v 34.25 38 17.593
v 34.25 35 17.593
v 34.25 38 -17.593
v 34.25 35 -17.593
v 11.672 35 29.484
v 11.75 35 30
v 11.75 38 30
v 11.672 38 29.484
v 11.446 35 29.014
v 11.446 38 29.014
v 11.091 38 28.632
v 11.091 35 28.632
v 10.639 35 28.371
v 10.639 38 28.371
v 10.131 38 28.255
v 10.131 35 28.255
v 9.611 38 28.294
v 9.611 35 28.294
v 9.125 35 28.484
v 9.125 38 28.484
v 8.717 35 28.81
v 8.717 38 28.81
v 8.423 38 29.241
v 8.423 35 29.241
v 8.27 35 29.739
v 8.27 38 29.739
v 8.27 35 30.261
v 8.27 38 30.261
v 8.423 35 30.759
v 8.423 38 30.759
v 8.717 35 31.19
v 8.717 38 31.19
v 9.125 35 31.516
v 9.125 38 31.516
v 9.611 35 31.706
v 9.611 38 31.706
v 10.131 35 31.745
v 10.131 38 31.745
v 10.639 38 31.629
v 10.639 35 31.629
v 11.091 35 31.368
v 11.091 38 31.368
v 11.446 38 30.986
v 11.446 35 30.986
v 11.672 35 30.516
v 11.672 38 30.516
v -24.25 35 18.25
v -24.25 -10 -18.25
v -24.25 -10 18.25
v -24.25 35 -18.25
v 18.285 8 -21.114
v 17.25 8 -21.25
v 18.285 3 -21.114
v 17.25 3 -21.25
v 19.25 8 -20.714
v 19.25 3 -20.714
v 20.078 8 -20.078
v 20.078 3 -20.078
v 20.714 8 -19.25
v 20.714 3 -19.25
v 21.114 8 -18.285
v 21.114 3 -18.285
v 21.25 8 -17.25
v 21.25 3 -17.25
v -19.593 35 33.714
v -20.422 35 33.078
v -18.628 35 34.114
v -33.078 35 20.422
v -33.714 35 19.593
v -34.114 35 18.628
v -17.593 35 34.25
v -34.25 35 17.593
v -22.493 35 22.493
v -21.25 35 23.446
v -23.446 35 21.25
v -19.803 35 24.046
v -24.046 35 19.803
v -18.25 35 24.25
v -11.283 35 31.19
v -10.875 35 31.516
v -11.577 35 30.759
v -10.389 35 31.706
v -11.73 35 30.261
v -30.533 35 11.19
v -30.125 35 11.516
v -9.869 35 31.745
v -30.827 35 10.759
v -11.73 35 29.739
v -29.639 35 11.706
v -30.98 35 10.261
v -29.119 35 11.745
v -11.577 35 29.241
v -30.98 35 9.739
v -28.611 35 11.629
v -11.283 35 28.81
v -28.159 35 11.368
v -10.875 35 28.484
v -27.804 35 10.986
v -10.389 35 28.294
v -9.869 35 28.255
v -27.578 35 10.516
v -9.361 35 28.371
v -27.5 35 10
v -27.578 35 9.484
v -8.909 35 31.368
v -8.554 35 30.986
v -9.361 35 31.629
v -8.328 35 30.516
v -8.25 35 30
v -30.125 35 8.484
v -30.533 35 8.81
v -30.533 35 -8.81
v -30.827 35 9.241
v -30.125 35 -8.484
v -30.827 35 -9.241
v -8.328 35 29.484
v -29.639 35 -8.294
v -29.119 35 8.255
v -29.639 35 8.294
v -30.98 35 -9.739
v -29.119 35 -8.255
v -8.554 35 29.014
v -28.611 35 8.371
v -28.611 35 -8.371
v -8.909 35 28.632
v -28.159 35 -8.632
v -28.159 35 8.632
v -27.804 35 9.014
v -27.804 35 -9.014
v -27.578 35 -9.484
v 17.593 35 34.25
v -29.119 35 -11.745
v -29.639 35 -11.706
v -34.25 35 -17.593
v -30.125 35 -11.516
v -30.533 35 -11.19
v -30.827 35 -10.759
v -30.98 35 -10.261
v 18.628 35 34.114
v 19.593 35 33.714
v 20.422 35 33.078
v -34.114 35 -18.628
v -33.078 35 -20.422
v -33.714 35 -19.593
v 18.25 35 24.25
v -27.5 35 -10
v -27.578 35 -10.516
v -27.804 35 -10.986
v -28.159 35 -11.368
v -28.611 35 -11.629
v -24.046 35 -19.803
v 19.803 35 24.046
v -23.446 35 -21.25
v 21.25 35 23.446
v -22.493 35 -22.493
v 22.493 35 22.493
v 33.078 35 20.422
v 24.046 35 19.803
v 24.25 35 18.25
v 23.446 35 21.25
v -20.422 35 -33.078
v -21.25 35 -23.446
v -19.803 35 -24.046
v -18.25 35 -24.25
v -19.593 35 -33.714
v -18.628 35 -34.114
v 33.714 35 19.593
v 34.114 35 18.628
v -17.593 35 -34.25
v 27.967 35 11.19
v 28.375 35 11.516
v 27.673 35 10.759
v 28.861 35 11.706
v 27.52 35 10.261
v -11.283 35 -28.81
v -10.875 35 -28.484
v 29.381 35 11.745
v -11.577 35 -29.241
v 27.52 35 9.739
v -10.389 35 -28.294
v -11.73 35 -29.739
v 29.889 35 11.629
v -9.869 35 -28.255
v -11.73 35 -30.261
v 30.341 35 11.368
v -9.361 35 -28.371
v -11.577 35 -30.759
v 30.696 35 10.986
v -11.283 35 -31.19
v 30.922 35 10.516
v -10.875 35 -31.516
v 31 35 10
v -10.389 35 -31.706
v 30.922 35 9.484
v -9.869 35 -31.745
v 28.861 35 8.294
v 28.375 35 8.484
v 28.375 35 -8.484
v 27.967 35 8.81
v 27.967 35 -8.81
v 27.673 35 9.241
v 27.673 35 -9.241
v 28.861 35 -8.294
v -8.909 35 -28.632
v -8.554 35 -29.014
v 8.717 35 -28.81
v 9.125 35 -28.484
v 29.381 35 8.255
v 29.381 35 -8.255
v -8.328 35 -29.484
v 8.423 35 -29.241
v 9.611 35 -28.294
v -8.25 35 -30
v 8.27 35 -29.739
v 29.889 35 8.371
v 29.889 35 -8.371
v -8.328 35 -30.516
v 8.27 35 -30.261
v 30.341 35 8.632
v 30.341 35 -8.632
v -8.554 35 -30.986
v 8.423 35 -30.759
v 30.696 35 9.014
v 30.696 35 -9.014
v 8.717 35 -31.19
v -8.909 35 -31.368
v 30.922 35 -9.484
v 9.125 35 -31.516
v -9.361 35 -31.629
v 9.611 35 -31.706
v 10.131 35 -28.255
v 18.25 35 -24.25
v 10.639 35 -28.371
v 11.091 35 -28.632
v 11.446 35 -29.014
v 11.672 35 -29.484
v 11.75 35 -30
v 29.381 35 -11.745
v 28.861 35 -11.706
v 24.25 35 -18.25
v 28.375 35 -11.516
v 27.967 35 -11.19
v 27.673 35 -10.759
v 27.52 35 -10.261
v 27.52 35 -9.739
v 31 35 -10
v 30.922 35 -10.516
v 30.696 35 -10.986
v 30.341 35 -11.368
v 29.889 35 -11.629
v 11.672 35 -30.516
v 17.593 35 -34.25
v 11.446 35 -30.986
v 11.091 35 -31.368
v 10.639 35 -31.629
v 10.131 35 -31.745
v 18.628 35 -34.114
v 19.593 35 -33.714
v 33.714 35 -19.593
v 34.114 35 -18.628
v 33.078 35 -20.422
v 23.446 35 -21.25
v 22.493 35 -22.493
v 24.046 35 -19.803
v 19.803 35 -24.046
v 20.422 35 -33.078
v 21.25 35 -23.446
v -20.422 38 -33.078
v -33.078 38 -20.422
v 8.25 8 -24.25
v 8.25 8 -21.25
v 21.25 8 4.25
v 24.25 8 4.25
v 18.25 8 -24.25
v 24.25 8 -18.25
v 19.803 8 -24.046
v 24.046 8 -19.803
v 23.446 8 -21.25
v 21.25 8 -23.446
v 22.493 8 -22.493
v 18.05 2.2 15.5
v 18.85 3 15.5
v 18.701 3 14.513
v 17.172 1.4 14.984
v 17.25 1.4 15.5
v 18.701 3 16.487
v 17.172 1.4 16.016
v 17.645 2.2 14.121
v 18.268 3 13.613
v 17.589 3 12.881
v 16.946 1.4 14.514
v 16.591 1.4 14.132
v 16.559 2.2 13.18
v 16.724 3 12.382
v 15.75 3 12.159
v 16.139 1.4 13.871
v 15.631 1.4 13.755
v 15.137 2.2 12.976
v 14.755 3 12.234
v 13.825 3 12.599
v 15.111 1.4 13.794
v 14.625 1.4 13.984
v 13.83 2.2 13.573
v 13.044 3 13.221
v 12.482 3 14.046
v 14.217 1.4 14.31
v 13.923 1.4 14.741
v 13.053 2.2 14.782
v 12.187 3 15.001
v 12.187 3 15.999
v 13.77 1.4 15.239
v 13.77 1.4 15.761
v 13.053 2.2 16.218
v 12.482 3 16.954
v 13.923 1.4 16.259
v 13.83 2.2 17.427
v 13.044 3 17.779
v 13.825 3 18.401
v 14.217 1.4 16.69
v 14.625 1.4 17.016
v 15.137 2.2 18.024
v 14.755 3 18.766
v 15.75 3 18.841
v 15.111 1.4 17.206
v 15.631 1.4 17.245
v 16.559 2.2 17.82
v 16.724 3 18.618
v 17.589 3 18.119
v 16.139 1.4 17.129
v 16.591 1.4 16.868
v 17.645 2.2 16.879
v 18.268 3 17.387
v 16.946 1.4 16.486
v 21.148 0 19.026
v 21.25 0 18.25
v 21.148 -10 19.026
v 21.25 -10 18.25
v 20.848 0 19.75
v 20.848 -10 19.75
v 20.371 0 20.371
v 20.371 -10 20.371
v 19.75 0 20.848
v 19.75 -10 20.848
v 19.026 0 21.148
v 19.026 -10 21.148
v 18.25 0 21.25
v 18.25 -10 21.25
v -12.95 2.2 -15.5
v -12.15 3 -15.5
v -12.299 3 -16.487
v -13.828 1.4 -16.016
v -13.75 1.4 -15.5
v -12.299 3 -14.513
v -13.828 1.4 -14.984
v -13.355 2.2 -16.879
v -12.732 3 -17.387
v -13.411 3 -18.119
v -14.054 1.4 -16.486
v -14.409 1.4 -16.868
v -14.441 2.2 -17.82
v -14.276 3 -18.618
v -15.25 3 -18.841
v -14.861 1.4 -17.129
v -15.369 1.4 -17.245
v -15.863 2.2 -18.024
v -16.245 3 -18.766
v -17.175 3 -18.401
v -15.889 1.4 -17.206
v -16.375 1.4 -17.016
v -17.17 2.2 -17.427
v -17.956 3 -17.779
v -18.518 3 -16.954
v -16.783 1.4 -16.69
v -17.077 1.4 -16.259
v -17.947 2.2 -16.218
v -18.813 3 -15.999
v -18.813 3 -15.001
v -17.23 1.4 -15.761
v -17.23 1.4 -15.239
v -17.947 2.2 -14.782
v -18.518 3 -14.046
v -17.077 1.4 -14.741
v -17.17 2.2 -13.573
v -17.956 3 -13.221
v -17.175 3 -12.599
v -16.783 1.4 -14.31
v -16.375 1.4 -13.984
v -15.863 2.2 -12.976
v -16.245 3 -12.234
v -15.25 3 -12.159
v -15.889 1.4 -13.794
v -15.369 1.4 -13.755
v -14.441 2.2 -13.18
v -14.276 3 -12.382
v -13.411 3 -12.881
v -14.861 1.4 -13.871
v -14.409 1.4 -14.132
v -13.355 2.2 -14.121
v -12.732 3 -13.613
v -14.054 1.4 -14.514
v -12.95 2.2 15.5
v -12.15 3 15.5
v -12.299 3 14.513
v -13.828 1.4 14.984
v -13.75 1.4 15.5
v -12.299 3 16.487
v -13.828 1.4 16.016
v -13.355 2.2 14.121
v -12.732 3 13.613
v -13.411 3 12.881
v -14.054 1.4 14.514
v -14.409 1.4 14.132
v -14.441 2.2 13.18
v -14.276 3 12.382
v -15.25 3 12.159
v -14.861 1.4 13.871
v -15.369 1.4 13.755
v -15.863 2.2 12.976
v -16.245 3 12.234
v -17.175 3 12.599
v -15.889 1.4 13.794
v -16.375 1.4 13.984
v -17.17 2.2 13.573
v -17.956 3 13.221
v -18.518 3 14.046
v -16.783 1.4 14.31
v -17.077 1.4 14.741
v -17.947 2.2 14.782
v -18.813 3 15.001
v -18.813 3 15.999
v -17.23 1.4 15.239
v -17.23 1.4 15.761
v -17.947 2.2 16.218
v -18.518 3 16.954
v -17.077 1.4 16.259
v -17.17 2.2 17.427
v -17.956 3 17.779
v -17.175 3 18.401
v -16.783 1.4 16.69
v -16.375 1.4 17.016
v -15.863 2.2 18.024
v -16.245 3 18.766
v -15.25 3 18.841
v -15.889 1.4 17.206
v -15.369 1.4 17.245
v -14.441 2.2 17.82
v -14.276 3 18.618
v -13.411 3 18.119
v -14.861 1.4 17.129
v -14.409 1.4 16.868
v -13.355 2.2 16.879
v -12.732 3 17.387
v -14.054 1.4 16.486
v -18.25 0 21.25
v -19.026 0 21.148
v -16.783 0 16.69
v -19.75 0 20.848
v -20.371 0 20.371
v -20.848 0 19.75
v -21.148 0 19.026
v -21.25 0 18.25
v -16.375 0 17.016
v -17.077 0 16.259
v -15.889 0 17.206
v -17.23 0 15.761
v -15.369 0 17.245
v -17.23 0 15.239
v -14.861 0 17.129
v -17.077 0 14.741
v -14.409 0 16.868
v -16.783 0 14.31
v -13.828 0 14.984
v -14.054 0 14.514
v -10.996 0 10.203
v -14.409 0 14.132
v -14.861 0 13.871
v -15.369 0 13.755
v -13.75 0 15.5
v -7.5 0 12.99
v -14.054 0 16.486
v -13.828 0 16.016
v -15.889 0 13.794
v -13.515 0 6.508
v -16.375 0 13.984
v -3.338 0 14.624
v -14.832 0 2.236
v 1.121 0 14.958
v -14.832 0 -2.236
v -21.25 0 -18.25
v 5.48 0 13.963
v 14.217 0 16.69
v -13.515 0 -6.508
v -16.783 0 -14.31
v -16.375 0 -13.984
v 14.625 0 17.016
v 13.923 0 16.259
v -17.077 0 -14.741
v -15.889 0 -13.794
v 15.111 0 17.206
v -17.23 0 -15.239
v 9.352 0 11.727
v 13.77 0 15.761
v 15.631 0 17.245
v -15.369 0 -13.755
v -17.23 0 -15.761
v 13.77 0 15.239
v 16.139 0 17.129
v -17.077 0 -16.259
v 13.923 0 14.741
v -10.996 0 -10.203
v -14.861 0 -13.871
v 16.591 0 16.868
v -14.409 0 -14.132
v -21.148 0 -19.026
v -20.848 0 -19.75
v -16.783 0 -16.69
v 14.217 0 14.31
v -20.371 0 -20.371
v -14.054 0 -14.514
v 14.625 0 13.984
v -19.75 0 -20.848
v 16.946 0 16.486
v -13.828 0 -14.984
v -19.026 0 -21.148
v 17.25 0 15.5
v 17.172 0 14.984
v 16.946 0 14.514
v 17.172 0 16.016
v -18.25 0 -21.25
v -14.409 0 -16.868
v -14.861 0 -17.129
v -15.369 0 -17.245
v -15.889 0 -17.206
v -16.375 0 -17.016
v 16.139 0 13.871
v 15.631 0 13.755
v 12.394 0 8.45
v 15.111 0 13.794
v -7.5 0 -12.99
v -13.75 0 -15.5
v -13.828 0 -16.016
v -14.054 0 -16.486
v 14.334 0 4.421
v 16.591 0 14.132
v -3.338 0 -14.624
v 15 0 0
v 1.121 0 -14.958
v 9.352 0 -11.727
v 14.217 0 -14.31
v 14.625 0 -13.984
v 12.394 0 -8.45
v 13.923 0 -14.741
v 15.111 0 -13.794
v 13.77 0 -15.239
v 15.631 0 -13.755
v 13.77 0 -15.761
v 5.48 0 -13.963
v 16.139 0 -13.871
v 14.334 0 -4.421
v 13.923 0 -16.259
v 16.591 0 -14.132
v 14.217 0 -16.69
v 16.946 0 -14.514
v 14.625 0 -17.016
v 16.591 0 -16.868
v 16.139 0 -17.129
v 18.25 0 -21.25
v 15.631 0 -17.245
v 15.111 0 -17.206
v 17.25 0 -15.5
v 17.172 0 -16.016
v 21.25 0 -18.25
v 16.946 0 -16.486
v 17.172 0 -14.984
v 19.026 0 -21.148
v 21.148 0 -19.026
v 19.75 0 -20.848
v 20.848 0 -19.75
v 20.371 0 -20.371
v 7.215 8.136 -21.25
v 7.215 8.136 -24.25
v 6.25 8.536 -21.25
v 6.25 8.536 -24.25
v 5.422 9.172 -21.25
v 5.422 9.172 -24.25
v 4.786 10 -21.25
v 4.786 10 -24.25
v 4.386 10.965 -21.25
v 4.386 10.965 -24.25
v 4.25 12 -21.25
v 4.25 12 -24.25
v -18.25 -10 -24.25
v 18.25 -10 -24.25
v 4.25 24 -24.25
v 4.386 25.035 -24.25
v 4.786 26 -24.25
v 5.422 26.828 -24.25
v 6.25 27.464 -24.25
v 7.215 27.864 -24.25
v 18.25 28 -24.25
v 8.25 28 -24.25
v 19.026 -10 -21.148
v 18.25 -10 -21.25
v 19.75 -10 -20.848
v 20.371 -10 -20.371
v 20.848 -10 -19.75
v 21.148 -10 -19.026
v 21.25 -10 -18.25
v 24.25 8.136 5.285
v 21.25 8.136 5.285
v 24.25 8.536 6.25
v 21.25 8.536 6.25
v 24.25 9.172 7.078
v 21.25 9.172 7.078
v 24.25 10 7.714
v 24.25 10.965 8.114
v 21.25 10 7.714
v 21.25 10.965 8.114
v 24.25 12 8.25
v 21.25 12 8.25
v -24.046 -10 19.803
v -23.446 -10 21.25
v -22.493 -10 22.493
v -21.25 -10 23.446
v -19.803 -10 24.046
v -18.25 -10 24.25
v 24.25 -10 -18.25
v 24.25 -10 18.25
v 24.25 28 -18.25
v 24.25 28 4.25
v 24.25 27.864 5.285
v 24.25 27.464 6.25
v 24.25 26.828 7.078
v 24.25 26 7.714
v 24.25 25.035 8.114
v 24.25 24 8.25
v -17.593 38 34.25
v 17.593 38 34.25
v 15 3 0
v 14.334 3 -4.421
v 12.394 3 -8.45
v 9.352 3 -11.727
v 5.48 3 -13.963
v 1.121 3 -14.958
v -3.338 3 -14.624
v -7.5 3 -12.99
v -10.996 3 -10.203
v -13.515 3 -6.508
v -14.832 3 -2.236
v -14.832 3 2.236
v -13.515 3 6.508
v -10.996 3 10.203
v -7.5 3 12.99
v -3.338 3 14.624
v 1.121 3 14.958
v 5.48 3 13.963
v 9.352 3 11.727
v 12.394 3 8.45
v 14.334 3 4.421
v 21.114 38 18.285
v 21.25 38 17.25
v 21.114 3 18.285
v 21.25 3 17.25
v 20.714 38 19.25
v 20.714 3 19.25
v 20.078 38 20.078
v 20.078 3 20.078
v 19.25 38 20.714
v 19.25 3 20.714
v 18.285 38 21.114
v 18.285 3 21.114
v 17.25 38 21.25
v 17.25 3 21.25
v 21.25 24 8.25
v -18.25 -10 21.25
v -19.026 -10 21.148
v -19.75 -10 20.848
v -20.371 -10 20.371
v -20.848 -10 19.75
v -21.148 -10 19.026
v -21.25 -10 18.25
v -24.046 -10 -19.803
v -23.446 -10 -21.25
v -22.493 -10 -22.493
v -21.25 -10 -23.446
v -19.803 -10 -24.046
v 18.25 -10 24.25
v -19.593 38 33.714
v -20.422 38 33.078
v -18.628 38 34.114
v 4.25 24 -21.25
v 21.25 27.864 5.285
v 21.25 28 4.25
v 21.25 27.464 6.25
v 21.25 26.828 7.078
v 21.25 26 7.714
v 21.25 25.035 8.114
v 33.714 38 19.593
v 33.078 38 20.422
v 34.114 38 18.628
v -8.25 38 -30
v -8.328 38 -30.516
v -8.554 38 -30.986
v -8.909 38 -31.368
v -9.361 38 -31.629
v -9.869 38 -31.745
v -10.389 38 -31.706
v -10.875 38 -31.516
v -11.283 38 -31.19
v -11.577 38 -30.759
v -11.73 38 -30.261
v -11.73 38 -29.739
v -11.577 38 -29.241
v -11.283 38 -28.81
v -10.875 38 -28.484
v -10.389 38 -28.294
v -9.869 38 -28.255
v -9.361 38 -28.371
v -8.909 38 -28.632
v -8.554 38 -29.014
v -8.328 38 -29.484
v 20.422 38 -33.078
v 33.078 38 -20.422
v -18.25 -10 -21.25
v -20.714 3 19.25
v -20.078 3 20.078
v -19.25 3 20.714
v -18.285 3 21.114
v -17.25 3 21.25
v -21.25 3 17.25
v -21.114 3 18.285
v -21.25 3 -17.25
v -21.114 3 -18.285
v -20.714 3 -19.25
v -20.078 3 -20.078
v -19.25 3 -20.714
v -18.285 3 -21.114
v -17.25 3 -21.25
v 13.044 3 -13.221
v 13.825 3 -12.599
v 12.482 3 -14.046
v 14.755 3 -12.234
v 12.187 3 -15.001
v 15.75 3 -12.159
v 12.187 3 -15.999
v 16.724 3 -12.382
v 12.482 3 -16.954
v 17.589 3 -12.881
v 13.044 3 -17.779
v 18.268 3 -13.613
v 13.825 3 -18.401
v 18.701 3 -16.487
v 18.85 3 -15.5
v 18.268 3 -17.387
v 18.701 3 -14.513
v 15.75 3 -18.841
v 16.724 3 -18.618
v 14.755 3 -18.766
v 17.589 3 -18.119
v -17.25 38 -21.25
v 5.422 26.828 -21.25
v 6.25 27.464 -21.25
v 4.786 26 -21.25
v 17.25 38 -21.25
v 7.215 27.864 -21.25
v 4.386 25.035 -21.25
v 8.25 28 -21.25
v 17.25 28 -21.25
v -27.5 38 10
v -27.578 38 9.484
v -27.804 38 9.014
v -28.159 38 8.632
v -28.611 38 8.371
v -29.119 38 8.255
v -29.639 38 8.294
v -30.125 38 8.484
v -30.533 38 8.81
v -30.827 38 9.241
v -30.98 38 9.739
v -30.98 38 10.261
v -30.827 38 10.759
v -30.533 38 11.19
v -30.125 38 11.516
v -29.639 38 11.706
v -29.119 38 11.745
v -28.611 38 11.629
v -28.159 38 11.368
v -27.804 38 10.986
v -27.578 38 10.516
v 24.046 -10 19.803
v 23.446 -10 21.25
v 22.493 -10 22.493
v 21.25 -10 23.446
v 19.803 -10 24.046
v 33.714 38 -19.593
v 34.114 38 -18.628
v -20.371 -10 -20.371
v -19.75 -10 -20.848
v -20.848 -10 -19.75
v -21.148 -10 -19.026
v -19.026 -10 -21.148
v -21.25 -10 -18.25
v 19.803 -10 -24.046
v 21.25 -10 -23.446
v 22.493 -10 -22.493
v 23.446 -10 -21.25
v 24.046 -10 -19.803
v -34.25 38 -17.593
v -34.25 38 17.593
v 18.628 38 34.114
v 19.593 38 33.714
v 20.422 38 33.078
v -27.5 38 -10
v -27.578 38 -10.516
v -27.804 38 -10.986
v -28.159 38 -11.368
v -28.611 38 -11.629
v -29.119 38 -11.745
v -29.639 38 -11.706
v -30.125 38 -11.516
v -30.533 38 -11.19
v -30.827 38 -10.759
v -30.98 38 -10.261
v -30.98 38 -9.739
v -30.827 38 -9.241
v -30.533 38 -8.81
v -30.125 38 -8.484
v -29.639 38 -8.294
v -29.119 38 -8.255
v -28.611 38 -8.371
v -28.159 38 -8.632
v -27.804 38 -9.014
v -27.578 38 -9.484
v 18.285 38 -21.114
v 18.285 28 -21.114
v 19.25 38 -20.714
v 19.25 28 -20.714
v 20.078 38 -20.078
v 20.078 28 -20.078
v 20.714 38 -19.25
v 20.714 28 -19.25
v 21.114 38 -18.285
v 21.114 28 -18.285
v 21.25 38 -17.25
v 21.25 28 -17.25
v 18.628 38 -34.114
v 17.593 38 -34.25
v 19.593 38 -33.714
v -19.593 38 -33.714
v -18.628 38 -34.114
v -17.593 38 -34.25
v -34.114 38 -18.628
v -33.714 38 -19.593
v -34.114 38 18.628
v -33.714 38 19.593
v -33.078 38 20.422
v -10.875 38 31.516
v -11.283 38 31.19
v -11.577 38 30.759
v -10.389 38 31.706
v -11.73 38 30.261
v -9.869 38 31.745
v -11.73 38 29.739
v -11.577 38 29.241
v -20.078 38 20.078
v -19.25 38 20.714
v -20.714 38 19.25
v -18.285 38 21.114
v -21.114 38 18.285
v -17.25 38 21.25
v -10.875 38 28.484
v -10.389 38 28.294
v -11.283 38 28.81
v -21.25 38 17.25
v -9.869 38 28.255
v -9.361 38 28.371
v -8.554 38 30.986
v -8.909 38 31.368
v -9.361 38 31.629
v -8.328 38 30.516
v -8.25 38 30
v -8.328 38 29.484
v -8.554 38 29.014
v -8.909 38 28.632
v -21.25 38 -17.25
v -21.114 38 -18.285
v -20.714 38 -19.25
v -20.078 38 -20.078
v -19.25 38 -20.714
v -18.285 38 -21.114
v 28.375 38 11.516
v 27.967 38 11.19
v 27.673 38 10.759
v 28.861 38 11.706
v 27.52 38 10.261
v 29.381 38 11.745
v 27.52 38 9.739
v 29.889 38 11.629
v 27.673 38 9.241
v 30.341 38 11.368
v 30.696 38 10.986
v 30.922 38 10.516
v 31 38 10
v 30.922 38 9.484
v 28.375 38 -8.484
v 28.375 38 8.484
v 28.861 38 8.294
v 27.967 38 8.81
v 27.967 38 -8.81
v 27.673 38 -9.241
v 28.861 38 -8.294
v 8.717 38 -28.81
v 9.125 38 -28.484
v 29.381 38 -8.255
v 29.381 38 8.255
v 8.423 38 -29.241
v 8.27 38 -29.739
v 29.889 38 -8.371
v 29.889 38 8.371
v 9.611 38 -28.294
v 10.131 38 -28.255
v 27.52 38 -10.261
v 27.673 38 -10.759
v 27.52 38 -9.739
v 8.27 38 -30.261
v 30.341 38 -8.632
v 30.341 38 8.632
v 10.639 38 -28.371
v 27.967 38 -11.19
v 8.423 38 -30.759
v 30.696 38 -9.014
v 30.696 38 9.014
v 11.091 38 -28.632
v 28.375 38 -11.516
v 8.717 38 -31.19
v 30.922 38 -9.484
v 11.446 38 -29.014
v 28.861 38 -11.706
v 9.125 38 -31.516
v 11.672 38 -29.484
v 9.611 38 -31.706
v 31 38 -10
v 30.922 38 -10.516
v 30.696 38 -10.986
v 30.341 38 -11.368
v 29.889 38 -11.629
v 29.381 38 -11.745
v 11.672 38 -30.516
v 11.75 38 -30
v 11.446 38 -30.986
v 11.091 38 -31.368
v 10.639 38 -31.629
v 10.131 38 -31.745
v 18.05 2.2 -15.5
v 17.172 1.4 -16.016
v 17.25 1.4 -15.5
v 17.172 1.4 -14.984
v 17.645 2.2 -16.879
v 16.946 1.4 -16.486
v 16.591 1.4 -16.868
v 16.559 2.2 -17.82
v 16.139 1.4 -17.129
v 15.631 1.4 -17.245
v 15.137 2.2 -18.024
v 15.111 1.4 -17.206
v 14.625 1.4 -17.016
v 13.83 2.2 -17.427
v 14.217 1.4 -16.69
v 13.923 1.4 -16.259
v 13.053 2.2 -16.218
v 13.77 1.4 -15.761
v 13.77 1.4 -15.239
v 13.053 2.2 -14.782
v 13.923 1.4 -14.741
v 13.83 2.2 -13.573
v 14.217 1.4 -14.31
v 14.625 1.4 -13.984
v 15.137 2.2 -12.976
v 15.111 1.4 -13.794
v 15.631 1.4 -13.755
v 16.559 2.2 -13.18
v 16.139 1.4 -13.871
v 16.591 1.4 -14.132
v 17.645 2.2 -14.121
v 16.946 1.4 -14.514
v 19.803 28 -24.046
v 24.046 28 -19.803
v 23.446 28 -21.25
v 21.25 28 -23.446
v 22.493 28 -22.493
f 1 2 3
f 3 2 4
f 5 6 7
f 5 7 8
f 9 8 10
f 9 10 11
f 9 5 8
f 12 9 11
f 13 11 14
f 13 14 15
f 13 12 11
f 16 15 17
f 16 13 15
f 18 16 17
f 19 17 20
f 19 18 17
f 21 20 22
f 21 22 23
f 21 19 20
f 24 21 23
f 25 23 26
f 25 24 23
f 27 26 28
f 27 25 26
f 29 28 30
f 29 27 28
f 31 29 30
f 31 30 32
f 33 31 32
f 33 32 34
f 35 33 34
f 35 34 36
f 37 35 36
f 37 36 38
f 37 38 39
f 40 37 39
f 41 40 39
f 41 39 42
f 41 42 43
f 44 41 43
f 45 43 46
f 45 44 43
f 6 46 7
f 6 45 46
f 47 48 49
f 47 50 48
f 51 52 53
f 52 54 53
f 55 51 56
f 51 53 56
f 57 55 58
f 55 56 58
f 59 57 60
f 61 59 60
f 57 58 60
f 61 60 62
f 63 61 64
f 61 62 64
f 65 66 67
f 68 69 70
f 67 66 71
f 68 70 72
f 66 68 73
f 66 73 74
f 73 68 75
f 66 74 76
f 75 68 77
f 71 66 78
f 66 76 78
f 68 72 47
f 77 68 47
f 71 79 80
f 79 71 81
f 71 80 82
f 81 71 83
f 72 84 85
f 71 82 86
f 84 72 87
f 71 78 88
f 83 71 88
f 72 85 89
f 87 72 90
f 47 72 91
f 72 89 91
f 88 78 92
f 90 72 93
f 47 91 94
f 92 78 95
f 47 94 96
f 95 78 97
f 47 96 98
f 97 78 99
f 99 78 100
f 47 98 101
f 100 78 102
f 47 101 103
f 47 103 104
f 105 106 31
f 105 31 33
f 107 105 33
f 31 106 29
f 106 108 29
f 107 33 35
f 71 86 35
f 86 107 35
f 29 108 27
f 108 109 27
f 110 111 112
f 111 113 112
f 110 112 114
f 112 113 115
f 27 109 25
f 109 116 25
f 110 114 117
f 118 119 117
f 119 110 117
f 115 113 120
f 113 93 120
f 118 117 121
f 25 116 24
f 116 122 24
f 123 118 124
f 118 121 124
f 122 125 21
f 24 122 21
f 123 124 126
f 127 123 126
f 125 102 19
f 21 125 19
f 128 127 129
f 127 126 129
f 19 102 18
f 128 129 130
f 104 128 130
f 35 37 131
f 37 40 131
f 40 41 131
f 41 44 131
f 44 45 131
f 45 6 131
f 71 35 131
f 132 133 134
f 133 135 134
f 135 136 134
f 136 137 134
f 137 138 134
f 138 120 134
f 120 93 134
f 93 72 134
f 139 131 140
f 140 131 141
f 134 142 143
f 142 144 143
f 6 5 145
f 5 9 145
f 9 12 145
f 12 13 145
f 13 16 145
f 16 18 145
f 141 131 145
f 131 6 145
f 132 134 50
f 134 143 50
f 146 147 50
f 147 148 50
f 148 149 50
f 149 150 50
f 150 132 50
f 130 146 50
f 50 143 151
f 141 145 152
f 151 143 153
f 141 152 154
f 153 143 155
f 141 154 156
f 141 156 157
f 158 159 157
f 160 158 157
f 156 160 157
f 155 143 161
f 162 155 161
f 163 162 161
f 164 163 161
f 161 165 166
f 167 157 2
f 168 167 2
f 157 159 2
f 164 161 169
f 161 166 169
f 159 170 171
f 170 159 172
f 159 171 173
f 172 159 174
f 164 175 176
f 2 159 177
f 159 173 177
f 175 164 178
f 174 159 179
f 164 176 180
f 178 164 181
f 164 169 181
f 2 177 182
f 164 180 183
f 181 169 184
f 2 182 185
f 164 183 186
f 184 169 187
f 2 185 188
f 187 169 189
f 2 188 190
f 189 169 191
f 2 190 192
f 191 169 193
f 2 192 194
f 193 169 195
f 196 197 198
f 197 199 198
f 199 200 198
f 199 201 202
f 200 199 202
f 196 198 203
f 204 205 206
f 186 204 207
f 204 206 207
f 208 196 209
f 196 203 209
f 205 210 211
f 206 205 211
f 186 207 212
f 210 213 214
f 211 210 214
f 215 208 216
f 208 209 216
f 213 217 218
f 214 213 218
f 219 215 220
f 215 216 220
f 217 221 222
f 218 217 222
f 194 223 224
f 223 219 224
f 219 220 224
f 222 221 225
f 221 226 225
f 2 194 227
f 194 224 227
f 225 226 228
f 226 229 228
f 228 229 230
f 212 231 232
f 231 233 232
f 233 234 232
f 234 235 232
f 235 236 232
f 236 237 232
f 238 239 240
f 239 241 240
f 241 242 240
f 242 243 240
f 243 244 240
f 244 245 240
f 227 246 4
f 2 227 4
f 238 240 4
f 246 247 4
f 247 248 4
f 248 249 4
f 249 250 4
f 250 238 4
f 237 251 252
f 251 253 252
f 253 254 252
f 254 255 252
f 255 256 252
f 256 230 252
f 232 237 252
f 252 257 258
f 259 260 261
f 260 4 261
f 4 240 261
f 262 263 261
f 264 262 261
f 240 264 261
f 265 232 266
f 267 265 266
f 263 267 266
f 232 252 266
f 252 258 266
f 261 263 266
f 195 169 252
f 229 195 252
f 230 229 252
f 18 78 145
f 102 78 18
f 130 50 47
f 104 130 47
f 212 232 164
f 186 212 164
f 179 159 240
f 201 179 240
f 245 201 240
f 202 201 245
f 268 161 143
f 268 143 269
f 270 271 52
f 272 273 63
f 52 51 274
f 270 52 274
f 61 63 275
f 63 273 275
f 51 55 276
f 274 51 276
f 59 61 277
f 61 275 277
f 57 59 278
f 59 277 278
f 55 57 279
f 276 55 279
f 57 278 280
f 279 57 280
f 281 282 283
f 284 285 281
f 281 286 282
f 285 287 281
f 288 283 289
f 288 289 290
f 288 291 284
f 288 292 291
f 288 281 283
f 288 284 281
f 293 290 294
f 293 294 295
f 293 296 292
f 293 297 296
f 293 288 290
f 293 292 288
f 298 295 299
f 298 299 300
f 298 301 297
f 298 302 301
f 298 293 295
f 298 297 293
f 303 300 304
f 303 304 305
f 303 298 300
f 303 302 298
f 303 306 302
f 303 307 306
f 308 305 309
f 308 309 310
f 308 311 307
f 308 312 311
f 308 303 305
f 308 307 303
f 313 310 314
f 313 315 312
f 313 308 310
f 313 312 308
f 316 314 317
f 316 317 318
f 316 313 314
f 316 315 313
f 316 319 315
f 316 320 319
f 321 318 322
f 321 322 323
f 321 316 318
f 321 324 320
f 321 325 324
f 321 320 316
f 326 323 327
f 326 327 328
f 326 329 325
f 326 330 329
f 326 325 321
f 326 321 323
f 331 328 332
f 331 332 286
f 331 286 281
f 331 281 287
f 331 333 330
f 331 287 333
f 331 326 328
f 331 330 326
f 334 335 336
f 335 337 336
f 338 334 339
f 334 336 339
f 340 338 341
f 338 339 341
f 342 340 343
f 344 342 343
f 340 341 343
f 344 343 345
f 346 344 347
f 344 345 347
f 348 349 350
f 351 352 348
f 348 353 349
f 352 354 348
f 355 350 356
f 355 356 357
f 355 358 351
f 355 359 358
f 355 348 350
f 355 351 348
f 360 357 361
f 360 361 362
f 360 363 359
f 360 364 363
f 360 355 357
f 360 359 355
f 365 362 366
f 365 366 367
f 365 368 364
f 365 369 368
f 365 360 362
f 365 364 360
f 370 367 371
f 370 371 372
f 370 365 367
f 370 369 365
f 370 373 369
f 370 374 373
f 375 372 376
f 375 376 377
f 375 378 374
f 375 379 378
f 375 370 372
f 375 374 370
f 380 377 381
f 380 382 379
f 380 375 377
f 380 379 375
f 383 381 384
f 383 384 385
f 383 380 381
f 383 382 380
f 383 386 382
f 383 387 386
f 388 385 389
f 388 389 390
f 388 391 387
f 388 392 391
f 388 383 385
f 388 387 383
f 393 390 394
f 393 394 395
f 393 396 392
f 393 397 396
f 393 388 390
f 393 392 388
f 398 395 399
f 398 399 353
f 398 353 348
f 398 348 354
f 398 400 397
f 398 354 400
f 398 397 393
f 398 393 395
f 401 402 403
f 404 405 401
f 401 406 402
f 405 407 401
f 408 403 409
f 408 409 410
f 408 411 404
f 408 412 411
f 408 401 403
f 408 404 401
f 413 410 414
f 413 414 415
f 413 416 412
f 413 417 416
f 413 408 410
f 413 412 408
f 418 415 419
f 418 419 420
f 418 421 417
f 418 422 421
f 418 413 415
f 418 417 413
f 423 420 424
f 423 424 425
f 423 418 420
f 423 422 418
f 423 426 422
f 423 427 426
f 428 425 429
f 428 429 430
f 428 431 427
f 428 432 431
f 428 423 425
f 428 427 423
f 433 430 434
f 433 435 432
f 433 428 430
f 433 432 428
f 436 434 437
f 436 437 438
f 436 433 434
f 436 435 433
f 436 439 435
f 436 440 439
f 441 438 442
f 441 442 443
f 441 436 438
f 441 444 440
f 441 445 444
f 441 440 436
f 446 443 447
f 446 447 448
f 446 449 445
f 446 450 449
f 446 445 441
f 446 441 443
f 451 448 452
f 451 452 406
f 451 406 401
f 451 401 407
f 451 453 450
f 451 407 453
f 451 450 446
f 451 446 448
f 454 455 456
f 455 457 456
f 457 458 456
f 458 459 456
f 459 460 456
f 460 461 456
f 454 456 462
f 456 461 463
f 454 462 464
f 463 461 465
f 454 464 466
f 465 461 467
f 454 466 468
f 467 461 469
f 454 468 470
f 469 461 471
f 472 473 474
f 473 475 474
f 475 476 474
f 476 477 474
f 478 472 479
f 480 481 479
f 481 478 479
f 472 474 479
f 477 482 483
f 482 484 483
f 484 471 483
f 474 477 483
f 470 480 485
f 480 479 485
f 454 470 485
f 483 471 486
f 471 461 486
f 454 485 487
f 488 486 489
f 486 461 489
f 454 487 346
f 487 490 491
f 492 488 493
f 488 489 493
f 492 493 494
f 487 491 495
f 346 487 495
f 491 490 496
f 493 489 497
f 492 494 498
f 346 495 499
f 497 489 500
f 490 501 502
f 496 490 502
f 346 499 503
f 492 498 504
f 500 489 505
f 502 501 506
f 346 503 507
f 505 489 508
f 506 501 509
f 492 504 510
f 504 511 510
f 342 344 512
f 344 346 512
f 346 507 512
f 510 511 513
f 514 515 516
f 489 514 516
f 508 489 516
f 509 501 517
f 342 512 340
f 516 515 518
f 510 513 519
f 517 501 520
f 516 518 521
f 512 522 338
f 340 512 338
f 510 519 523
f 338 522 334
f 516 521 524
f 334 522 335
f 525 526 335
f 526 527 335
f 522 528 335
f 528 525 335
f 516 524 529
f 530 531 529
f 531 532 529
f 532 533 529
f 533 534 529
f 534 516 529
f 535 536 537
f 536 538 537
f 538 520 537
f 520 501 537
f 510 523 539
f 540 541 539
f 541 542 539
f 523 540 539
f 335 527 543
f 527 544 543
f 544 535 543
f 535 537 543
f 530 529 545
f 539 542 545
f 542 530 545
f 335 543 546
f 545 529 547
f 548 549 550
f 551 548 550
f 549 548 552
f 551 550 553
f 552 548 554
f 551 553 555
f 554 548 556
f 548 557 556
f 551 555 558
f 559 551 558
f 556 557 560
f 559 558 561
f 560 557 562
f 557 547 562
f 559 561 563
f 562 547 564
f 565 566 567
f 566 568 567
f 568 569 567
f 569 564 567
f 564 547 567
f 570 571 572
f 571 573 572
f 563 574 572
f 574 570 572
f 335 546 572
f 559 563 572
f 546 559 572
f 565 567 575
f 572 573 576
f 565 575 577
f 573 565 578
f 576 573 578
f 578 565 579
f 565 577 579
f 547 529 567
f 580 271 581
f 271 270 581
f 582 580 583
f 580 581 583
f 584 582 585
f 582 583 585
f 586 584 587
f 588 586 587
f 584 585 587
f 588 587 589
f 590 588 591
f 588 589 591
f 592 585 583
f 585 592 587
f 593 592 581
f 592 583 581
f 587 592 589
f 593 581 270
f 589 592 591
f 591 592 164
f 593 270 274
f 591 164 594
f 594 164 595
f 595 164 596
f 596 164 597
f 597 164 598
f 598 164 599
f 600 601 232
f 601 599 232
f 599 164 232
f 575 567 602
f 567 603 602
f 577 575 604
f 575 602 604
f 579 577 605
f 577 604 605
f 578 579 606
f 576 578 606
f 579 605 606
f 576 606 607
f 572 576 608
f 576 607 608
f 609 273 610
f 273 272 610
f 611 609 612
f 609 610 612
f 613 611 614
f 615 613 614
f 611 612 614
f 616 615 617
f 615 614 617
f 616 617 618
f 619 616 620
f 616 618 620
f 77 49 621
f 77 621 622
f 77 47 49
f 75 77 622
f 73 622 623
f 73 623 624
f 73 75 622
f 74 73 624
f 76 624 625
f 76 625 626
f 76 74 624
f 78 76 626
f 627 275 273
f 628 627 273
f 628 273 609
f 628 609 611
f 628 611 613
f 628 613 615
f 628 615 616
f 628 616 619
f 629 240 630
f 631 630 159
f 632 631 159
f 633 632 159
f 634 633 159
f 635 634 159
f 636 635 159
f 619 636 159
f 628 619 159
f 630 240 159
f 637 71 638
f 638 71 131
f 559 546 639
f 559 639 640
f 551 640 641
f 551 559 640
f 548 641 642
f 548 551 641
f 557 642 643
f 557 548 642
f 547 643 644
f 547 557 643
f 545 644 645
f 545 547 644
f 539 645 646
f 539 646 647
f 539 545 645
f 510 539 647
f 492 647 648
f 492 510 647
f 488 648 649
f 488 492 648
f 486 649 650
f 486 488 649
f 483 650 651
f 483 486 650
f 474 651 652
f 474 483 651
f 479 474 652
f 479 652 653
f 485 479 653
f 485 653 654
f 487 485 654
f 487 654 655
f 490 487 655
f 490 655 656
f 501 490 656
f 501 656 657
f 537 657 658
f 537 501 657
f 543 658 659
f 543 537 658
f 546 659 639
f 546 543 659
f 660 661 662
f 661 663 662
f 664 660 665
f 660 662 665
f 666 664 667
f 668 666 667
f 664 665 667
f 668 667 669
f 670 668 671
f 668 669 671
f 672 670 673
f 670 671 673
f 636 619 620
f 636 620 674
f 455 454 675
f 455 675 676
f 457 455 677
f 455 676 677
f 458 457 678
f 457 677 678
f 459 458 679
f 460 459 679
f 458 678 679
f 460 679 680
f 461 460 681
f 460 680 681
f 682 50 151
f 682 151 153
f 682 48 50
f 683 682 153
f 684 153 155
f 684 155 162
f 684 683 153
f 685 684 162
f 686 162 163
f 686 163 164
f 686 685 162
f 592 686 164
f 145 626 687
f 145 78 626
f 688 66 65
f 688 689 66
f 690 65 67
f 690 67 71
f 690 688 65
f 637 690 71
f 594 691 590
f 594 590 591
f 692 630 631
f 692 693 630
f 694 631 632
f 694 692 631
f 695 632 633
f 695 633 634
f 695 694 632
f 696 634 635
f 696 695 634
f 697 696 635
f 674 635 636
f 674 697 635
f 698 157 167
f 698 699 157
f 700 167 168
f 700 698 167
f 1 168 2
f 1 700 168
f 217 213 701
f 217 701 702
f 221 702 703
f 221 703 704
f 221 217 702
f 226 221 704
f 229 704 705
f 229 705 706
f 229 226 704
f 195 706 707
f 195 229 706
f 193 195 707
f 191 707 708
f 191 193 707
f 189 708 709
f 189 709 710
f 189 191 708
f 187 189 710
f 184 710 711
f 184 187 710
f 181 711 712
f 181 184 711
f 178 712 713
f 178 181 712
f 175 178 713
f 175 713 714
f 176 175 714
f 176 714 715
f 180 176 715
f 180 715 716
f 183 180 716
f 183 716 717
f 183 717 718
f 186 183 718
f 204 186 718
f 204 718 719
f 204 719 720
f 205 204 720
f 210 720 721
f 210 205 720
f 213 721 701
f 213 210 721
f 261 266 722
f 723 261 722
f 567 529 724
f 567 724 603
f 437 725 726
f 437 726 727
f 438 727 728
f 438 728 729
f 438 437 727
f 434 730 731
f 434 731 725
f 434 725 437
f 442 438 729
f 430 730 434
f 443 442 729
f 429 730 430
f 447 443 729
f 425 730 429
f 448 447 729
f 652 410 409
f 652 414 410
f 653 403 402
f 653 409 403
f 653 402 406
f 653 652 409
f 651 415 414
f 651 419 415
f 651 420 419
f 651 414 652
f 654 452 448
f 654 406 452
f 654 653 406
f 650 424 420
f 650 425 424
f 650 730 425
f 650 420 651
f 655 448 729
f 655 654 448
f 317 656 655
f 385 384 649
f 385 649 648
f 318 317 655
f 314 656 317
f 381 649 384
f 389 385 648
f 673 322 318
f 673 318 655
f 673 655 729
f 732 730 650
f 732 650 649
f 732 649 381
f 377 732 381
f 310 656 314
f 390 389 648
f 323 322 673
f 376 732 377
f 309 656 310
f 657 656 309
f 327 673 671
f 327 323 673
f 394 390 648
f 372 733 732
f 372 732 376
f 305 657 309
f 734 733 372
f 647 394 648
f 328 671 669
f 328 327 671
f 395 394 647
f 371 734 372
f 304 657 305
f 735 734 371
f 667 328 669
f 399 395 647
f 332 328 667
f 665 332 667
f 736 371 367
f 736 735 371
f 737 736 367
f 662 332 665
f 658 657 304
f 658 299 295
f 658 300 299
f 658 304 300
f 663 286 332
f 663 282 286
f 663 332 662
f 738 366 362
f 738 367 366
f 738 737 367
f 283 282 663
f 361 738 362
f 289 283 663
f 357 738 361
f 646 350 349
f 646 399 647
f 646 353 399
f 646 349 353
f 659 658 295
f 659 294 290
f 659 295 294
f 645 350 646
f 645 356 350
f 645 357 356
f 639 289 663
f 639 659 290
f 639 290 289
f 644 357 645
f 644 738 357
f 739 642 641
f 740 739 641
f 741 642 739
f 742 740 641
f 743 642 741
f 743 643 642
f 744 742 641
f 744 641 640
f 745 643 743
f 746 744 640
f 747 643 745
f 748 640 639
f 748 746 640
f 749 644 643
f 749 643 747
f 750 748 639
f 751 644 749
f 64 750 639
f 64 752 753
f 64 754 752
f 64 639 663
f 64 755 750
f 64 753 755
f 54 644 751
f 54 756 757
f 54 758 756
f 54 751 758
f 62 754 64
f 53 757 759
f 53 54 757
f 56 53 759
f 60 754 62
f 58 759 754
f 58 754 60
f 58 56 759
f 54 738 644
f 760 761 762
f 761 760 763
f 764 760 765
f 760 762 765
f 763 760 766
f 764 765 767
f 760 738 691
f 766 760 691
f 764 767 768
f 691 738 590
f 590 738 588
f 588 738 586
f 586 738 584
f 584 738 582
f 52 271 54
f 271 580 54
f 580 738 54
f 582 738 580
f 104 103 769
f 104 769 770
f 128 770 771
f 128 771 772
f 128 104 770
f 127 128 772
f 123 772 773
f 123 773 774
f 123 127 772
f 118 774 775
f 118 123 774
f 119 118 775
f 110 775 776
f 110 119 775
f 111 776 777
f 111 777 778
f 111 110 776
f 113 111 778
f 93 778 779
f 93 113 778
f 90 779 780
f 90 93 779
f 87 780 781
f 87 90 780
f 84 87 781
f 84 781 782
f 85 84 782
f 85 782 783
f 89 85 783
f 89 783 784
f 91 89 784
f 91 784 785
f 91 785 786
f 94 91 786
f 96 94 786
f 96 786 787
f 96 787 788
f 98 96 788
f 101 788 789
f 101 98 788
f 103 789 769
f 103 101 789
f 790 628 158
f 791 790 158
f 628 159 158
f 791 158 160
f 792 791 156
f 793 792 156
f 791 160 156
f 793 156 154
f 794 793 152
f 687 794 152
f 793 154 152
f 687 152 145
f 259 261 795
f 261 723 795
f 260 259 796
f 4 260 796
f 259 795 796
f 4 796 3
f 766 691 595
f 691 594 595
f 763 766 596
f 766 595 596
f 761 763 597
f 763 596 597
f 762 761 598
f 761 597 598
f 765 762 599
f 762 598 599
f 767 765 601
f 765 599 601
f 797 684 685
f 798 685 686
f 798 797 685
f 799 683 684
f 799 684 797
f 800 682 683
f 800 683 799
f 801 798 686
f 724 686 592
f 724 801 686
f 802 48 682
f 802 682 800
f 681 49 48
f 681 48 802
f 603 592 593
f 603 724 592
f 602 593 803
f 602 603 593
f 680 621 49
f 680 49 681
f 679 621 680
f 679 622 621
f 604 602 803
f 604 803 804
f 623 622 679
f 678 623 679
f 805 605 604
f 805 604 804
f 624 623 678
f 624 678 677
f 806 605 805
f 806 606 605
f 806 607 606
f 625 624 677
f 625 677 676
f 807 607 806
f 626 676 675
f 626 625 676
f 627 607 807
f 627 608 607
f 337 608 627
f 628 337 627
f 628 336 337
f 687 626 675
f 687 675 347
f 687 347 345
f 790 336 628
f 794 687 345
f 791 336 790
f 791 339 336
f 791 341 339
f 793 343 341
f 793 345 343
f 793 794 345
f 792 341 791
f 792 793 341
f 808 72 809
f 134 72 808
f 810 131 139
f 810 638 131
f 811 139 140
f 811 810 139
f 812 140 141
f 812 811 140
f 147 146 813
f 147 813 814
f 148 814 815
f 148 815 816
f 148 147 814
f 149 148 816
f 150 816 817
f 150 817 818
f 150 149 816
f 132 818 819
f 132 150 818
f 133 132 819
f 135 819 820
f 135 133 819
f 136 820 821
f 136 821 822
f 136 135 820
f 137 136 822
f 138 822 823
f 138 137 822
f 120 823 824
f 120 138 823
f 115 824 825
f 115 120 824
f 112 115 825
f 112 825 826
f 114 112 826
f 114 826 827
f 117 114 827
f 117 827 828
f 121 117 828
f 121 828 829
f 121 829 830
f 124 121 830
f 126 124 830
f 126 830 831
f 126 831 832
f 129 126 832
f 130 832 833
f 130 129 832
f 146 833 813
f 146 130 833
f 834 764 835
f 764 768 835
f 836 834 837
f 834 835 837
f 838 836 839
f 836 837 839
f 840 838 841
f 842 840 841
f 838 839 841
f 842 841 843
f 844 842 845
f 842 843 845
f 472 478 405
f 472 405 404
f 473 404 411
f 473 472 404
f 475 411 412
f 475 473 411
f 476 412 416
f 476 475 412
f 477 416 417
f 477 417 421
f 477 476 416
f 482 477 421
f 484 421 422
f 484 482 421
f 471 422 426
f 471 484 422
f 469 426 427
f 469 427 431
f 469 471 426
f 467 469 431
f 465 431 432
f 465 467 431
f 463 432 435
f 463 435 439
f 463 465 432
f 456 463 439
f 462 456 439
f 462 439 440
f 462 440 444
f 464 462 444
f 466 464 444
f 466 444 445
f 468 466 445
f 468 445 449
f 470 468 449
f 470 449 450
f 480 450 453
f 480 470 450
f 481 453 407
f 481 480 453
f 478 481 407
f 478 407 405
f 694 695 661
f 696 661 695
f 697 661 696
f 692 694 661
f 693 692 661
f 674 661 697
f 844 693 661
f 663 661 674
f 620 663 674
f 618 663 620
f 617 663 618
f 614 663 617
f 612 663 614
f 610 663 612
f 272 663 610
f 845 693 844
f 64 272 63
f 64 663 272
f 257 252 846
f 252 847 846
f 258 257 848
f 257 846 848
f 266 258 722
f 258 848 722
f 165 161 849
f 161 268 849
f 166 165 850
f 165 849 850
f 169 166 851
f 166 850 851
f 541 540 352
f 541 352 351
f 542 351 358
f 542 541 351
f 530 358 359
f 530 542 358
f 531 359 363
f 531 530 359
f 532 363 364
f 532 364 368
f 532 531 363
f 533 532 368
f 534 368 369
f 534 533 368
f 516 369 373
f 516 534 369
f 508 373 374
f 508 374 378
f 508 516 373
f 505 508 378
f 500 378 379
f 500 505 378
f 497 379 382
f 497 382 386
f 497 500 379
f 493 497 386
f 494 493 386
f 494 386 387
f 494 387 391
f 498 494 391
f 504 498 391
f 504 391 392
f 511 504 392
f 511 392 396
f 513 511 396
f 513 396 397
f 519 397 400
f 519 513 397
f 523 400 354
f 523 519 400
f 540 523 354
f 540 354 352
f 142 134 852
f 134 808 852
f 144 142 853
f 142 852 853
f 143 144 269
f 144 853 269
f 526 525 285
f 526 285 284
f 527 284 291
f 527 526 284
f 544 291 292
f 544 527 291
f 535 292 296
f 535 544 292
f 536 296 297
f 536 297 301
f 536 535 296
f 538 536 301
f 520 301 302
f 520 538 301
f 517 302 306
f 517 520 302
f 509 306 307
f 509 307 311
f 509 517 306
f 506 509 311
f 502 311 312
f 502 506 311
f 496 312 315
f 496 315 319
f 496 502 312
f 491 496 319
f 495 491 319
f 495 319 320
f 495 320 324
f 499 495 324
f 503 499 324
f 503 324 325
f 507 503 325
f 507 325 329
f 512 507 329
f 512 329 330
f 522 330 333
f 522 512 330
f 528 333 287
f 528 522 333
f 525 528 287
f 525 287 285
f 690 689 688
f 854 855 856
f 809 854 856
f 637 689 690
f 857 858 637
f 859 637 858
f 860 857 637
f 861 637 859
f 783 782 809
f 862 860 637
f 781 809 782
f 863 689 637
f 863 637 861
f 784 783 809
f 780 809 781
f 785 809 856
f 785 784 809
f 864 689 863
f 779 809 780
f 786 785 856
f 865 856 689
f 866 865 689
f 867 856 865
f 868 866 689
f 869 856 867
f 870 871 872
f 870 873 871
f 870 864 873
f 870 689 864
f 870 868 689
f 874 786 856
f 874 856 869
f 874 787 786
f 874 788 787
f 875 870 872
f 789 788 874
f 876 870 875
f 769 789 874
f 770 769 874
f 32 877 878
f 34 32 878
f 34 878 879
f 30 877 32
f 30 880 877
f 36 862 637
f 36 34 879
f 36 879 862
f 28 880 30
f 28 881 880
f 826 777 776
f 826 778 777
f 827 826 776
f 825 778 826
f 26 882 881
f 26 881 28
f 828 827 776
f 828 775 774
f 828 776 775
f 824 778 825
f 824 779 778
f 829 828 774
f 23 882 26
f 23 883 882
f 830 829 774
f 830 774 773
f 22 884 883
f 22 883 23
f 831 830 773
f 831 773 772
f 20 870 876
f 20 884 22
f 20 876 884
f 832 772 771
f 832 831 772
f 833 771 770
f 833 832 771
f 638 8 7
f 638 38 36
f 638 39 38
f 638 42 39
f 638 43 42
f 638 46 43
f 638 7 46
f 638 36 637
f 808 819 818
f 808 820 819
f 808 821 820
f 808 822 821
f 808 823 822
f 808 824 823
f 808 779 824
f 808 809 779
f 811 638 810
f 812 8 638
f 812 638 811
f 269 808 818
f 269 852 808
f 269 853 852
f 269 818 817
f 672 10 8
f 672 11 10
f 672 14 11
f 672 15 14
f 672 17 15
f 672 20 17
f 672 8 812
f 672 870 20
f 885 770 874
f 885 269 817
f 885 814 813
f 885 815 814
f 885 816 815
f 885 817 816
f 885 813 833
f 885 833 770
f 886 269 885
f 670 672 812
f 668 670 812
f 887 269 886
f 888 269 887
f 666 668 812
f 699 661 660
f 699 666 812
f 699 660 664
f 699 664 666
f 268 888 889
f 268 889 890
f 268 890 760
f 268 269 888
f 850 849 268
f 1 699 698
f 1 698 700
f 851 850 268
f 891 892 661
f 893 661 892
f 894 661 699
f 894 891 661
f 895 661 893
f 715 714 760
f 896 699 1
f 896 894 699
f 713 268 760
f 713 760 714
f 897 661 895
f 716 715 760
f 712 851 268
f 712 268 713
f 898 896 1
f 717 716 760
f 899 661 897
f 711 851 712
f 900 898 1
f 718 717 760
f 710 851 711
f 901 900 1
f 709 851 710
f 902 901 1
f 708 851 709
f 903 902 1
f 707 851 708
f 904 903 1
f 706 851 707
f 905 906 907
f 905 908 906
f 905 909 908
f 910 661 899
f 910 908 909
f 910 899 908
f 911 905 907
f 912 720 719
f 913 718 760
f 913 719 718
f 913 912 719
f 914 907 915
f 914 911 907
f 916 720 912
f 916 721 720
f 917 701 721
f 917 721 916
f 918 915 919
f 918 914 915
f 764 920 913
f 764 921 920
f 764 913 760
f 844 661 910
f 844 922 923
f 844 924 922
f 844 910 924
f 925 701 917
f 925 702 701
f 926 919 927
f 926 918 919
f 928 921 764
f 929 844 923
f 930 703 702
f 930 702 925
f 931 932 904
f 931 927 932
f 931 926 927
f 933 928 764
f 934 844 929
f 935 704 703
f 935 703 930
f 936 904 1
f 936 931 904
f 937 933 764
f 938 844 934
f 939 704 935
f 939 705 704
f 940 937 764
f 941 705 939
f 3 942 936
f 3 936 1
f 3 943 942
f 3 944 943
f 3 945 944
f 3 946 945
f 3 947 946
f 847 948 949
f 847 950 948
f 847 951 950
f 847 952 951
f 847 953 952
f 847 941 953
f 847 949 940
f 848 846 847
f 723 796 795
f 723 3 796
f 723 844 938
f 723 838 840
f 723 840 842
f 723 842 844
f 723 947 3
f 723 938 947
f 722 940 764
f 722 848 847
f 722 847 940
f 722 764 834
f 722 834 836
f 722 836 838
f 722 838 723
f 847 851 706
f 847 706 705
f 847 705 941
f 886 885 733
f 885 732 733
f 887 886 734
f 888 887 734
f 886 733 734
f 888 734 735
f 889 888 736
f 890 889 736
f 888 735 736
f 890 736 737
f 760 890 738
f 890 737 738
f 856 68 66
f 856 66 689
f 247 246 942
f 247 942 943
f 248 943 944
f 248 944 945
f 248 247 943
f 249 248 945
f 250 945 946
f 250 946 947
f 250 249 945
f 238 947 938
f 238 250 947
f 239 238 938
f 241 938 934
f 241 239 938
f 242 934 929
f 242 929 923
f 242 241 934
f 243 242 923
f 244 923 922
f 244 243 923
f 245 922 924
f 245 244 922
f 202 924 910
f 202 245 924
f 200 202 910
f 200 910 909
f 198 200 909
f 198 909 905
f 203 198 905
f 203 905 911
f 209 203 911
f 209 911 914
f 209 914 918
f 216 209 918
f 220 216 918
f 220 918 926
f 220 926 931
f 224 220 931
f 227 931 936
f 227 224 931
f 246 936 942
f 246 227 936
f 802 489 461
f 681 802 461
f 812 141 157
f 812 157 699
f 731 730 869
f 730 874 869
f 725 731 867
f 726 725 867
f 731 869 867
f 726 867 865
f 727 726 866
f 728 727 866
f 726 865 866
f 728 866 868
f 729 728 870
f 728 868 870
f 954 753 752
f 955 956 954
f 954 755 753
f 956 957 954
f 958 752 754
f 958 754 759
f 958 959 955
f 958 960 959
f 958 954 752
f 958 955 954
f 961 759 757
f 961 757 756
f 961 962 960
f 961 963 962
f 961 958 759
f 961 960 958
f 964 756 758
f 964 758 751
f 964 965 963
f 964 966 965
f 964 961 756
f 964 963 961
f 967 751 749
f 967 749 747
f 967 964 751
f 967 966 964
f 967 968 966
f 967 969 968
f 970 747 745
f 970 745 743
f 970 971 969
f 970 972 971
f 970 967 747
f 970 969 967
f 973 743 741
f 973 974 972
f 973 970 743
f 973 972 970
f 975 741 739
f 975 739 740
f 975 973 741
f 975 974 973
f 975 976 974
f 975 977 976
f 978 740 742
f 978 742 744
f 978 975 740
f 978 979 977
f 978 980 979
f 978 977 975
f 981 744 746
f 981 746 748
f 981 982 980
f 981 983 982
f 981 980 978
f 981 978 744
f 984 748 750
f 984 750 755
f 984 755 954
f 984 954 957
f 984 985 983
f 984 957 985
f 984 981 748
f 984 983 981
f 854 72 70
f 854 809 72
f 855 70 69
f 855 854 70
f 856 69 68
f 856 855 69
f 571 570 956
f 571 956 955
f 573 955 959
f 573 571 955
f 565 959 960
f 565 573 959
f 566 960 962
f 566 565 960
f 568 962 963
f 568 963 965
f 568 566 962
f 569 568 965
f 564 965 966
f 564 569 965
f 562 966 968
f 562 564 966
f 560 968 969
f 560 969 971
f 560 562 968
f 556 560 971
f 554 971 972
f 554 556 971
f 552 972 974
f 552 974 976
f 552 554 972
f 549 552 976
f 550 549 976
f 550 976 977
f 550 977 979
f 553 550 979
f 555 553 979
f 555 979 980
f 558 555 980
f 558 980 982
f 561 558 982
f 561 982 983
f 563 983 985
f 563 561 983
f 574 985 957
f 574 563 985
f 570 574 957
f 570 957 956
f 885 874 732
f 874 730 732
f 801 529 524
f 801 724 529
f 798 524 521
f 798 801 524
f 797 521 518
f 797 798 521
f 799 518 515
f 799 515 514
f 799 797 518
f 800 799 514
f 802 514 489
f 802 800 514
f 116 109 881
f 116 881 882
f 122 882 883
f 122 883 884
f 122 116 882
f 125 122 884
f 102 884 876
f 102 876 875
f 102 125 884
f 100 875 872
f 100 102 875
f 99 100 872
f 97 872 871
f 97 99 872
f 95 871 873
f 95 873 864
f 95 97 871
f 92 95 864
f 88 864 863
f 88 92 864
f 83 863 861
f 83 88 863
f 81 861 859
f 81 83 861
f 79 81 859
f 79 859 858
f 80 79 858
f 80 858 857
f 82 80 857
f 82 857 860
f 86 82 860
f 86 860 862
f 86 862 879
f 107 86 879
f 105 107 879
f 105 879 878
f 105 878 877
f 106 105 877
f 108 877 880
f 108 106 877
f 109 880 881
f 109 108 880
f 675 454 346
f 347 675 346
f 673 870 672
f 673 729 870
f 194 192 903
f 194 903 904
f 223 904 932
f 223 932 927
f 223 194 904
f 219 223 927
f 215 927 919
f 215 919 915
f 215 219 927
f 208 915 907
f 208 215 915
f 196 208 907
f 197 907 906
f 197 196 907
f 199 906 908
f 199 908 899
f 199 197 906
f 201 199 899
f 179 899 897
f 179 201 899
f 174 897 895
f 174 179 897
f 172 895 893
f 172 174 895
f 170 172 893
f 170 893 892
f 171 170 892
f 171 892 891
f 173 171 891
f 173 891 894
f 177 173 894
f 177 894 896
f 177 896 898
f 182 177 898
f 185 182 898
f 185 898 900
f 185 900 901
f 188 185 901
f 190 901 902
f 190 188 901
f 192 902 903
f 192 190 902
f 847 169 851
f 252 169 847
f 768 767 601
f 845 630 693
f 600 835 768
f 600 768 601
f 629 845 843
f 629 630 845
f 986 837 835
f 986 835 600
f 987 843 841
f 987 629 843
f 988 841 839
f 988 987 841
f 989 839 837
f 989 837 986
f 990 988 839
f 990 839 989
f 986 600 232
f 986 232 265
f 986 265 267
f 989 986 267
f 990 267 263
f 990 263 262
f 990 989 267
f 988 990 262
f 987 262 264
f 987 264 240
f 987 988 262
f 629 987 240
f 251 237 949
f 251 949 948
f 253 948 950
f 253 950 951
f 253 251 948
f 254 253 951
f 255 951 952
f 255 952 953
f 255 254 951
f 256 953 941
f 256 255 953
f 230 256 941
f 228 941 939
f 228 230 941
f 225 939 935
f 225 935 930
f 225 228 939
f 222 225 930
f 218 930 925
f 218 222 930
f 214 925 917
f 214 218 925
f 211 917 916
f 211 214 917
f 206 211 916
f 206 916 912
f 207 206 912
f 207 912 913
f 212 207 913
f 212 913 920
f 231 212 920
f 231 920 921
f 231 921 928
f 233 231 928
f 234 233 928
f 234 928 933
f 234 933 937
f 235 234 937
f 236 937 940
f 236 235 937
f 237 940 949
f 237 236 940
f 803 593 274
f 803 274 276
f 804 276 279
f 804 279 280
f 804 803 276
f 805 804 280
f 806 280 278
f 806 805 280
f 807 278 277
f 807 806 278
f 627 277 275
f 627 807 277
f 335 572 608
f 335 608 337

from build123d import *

# Parameters (mm, degrees)
SKETCH2_W           = 48.5
SKETCH2_H           = 48.5
SKETCH2_R           = 15
SKETCH2_R_2         = 1.75
BOSS_EXTRUDE1_DEPTH = 3
SKETCH3_W           = 48.5
SKETCH3_H           = 48.5
SKETCH3_W_2         = 42.5
SKETCH3_H_2         = 42.5
BOSS_EXTRUDE2_DEPTH = 32
SKETCH4_W           = 68.5
SKETCH4_H           = 68.5
SKETCH4_R           = 1.75
SKETCH4_W_2         = 42.5
SKETCH4_H_2         = 42.5
BOSS_EXTRUDE3_DEPTH = 3
CHAMFER1_SIZE       = 15
SKETCH5_W           = 48.5
SKETCH5_H           = 48.5
SKETCH5_W_2         = 42.5
SKETCH5_H_2         = 42.5
BOSS_EXTRUDE4_DEPTH = 10
FILLET1_R           = 6
SKETCH7_W           = 45
SKETCH7_H           = 20
CUT_EXTRUDE2_DEPTH  = 20
FILLET2_R           = 4
CHAMFER2_SIZE       = 1.6
FILLET4_R           = 4
FILLET5_R           = 4
FILLET6_R           = 3


with BuildPart() as part:
    # Sketch2 → Boss-Extrude1 (new body)
    with BuildSketch(Plane(origin=(0, 0, 0), x_dir=(1, 0, 0), z_dir=(0, 1, 0))):
        Rectangle(SKETCH2_W, SKETCH2_H)
        Circle(SKETCH2_R, mode=Mode.SUBTRACT)
        with Locations((-15.5, 15.5)):
            Circle(SKETCH2_R_2, mode=Mode.SUBTRACT)
        with Locations((15.5, 15.5)):
            Circle(SKETCH2_R_2, mode=Mode.SUBTRACT)
        with Locations((15.5, -15.5)):
            Circle(SKETCH2_R_2, mode=Mode.SUBTRACT)
        with Locations((-15.5, -15.5)):
            Circle(SKETCH2_R_2, mode=Mode.SUBTRACT)
    extrude(amount=BOSS_EXTRUDE1_DEPTH)

    # Sketch3 → Boss-Extrude2 (add)
    with BuildSketch(Plane(origin=(0, 3, 0), x_dir=(1, 0, 0), z_dir=(0, 1, 0))):
        Rectangle(SKETCH3_W, SKETCH3_H)
        Rectangle(SKETCH3_W_2, SKETCH3_H_2, mode=Mode.SUBTRACT)
    extrude(amount=BOSS_EXTRUDE2_DEPTH)

    # Sketch4 → Boss-Extrude3 (add)
    with BuildSketch(Plane(origin=(0, 35, 0), x_dir=(1, 0, 0), z_dir=(0, 1, 0))):
        Rectangle(SKETCH4_W, SKETCH4_H)
        with Locations((-10, 30)):
            Circle(SKETCH4_R, mode=Mode.SUBTRACT)
        with Locations((10, 30)):
            Circle(SKETCH4_R, mode=Mode.SUBTRACT)
        with Locations((-29.25, 10)):
            Circle(SKETCH4_R, mode=Mode.SUBTRACT)
        with Locations((-29.25, -10)):
            Circle(SKETCH4_R, mode=Mode.SUBTRACT)
        with Locations((-10, -30)):
            Circle(SKETCH4_R, mode=Mode.SUBTRACT)
        with Locations((10, -30)):
            Circle(SKETCH4_R, mode=Mode.SUBTRACT)
        with Locations((29.25, -10)):
            Circle(SKETCH4_R, mode=Mode.SUBTRACT)
        with Locations((29.25, 10)):
            Circle(SKETCH4_R, mode=Mode.SUBTRACT)
        Rectangle(SKETCH4_W_2, SKETCH4_H_2, mode=Mode.SUBTRACT)
    extrude(amount=BOSS_EXTRUDE3_DEPTH)

    # Chamfer1
    chamfer1_edges = [part.edges().sort_by_distance(p)[0] for p in [
        (-34.25, 36.5, 34.25),
        (34.25, 36.5, 34.25),
        (34.25, 36.5, -34.25),
        (-34.25, 36.5, -34.25),
    ]]
    chamfer(chamfer1_edges, length=CHAMFER1_SIZE)

    # Sketch5 → Boss-Extrude4 (add)
    with BuildSketch(Plane.XZ):
        Rectangle(SKETCH5_W, SKETCH5_H)
        Rectangle(SKETCH5_W_2, SKETCH5_H_2, mode=Mode.SUBTRACT)
    extrude(amount=BOSS_EXTRUDE4_DEPTH)

    # Fillet1
    fillet1_edges = [part.edges().sort_by_distance(p)[0] for p in [
        (-24.25, 12.5, -24.25),
        (24.25, 12.5, -24.25),
        (24.25, 12.5, 24.25),
        (-24.25, 12.5, 24.25),
    ]]
    fillet(fillet1_edges, radius=FILLET1_R)

    # Sketch7 → Cut-Extrude2 (cut)
    with BuildSketch(Plane(origin=(24.25, 0, 0), x_dir=(0, 0, -1), z_dir=(1, 0, 0))):
        with Locations((14.25, 18)):
            Rectangle(SKETCH7_W, SKETCH7_H)
    extrude(amount=-CUT_EXTRUDE2_DEPTH, mode=Mode.SUBTRACT)

    # Fillet2
    fillet2_edges = [part.edges().sort_by_distance(p)[0] for p in [
        (-19.25, 36.5, 34.25),
        (19.25, 36.5, 34.25),
        (-19.25, 36.5, -34.25),
        (19.25, 36.5, -34.25),
        (-34.25, 36.5, 19.25),
        (-34.25, 36.5, -19.25),
        (34.25, 36.5, -19.25),
        (34.25, 36.5, 19.25),
    ]]
    fillet(fillet2_edges, radius=FILLET2_R)

    # Chamfer2
    chamfer2_edges = [part.edges().sort_by_distance(p)[0] for p in [
        (-17.25, 3, -15.5),
        (13.75, 3, -15.5),
        (13.75, 3, 15.5),
        (-17.25, 3, 15.5),
    ]]
    chamfer(chamfer2_edges, length=CHAMFER2_SIZE)

    # Fillet4
    fillet4_edges = [part.edges().sort_by_distance(p)[0] for p in [
        (21.25, 5.5, -21.25),
        (21.25, 33, -21.25),
        (-21.25, 20.5, -21.25),
        (-21.25, 20.5, 21.25),
        (21.25, 20.5, 21.25),
    ]]
    fillet(fillet4_edges, radius=FILLET4_R)

    # Fillet5
    fillet5_edges = [part.edges().sort_by_distance(p)[0] for p in [
        (4.25, 8, -22.75),
        (22.75, 28, 8.25),
        (4.25, 28, -22.75),
        (22.75, 8, 8.25),
    ]]
    fillet(fillet5_edges, radius=FILLET5_R)

    # Fillet6
    fillet6_edges = [part.edges().sort_by_distance(p)[0] for p in [
        (21.25, -5, 21.25),
        (-21.25, -5, 21.25),
        (-21.25, -5, -21.25),
        (21.25, -5, -21.25),
    ]]
    fillet(fillet6_edges, radius=FILLET6_R)


solid = part.part
